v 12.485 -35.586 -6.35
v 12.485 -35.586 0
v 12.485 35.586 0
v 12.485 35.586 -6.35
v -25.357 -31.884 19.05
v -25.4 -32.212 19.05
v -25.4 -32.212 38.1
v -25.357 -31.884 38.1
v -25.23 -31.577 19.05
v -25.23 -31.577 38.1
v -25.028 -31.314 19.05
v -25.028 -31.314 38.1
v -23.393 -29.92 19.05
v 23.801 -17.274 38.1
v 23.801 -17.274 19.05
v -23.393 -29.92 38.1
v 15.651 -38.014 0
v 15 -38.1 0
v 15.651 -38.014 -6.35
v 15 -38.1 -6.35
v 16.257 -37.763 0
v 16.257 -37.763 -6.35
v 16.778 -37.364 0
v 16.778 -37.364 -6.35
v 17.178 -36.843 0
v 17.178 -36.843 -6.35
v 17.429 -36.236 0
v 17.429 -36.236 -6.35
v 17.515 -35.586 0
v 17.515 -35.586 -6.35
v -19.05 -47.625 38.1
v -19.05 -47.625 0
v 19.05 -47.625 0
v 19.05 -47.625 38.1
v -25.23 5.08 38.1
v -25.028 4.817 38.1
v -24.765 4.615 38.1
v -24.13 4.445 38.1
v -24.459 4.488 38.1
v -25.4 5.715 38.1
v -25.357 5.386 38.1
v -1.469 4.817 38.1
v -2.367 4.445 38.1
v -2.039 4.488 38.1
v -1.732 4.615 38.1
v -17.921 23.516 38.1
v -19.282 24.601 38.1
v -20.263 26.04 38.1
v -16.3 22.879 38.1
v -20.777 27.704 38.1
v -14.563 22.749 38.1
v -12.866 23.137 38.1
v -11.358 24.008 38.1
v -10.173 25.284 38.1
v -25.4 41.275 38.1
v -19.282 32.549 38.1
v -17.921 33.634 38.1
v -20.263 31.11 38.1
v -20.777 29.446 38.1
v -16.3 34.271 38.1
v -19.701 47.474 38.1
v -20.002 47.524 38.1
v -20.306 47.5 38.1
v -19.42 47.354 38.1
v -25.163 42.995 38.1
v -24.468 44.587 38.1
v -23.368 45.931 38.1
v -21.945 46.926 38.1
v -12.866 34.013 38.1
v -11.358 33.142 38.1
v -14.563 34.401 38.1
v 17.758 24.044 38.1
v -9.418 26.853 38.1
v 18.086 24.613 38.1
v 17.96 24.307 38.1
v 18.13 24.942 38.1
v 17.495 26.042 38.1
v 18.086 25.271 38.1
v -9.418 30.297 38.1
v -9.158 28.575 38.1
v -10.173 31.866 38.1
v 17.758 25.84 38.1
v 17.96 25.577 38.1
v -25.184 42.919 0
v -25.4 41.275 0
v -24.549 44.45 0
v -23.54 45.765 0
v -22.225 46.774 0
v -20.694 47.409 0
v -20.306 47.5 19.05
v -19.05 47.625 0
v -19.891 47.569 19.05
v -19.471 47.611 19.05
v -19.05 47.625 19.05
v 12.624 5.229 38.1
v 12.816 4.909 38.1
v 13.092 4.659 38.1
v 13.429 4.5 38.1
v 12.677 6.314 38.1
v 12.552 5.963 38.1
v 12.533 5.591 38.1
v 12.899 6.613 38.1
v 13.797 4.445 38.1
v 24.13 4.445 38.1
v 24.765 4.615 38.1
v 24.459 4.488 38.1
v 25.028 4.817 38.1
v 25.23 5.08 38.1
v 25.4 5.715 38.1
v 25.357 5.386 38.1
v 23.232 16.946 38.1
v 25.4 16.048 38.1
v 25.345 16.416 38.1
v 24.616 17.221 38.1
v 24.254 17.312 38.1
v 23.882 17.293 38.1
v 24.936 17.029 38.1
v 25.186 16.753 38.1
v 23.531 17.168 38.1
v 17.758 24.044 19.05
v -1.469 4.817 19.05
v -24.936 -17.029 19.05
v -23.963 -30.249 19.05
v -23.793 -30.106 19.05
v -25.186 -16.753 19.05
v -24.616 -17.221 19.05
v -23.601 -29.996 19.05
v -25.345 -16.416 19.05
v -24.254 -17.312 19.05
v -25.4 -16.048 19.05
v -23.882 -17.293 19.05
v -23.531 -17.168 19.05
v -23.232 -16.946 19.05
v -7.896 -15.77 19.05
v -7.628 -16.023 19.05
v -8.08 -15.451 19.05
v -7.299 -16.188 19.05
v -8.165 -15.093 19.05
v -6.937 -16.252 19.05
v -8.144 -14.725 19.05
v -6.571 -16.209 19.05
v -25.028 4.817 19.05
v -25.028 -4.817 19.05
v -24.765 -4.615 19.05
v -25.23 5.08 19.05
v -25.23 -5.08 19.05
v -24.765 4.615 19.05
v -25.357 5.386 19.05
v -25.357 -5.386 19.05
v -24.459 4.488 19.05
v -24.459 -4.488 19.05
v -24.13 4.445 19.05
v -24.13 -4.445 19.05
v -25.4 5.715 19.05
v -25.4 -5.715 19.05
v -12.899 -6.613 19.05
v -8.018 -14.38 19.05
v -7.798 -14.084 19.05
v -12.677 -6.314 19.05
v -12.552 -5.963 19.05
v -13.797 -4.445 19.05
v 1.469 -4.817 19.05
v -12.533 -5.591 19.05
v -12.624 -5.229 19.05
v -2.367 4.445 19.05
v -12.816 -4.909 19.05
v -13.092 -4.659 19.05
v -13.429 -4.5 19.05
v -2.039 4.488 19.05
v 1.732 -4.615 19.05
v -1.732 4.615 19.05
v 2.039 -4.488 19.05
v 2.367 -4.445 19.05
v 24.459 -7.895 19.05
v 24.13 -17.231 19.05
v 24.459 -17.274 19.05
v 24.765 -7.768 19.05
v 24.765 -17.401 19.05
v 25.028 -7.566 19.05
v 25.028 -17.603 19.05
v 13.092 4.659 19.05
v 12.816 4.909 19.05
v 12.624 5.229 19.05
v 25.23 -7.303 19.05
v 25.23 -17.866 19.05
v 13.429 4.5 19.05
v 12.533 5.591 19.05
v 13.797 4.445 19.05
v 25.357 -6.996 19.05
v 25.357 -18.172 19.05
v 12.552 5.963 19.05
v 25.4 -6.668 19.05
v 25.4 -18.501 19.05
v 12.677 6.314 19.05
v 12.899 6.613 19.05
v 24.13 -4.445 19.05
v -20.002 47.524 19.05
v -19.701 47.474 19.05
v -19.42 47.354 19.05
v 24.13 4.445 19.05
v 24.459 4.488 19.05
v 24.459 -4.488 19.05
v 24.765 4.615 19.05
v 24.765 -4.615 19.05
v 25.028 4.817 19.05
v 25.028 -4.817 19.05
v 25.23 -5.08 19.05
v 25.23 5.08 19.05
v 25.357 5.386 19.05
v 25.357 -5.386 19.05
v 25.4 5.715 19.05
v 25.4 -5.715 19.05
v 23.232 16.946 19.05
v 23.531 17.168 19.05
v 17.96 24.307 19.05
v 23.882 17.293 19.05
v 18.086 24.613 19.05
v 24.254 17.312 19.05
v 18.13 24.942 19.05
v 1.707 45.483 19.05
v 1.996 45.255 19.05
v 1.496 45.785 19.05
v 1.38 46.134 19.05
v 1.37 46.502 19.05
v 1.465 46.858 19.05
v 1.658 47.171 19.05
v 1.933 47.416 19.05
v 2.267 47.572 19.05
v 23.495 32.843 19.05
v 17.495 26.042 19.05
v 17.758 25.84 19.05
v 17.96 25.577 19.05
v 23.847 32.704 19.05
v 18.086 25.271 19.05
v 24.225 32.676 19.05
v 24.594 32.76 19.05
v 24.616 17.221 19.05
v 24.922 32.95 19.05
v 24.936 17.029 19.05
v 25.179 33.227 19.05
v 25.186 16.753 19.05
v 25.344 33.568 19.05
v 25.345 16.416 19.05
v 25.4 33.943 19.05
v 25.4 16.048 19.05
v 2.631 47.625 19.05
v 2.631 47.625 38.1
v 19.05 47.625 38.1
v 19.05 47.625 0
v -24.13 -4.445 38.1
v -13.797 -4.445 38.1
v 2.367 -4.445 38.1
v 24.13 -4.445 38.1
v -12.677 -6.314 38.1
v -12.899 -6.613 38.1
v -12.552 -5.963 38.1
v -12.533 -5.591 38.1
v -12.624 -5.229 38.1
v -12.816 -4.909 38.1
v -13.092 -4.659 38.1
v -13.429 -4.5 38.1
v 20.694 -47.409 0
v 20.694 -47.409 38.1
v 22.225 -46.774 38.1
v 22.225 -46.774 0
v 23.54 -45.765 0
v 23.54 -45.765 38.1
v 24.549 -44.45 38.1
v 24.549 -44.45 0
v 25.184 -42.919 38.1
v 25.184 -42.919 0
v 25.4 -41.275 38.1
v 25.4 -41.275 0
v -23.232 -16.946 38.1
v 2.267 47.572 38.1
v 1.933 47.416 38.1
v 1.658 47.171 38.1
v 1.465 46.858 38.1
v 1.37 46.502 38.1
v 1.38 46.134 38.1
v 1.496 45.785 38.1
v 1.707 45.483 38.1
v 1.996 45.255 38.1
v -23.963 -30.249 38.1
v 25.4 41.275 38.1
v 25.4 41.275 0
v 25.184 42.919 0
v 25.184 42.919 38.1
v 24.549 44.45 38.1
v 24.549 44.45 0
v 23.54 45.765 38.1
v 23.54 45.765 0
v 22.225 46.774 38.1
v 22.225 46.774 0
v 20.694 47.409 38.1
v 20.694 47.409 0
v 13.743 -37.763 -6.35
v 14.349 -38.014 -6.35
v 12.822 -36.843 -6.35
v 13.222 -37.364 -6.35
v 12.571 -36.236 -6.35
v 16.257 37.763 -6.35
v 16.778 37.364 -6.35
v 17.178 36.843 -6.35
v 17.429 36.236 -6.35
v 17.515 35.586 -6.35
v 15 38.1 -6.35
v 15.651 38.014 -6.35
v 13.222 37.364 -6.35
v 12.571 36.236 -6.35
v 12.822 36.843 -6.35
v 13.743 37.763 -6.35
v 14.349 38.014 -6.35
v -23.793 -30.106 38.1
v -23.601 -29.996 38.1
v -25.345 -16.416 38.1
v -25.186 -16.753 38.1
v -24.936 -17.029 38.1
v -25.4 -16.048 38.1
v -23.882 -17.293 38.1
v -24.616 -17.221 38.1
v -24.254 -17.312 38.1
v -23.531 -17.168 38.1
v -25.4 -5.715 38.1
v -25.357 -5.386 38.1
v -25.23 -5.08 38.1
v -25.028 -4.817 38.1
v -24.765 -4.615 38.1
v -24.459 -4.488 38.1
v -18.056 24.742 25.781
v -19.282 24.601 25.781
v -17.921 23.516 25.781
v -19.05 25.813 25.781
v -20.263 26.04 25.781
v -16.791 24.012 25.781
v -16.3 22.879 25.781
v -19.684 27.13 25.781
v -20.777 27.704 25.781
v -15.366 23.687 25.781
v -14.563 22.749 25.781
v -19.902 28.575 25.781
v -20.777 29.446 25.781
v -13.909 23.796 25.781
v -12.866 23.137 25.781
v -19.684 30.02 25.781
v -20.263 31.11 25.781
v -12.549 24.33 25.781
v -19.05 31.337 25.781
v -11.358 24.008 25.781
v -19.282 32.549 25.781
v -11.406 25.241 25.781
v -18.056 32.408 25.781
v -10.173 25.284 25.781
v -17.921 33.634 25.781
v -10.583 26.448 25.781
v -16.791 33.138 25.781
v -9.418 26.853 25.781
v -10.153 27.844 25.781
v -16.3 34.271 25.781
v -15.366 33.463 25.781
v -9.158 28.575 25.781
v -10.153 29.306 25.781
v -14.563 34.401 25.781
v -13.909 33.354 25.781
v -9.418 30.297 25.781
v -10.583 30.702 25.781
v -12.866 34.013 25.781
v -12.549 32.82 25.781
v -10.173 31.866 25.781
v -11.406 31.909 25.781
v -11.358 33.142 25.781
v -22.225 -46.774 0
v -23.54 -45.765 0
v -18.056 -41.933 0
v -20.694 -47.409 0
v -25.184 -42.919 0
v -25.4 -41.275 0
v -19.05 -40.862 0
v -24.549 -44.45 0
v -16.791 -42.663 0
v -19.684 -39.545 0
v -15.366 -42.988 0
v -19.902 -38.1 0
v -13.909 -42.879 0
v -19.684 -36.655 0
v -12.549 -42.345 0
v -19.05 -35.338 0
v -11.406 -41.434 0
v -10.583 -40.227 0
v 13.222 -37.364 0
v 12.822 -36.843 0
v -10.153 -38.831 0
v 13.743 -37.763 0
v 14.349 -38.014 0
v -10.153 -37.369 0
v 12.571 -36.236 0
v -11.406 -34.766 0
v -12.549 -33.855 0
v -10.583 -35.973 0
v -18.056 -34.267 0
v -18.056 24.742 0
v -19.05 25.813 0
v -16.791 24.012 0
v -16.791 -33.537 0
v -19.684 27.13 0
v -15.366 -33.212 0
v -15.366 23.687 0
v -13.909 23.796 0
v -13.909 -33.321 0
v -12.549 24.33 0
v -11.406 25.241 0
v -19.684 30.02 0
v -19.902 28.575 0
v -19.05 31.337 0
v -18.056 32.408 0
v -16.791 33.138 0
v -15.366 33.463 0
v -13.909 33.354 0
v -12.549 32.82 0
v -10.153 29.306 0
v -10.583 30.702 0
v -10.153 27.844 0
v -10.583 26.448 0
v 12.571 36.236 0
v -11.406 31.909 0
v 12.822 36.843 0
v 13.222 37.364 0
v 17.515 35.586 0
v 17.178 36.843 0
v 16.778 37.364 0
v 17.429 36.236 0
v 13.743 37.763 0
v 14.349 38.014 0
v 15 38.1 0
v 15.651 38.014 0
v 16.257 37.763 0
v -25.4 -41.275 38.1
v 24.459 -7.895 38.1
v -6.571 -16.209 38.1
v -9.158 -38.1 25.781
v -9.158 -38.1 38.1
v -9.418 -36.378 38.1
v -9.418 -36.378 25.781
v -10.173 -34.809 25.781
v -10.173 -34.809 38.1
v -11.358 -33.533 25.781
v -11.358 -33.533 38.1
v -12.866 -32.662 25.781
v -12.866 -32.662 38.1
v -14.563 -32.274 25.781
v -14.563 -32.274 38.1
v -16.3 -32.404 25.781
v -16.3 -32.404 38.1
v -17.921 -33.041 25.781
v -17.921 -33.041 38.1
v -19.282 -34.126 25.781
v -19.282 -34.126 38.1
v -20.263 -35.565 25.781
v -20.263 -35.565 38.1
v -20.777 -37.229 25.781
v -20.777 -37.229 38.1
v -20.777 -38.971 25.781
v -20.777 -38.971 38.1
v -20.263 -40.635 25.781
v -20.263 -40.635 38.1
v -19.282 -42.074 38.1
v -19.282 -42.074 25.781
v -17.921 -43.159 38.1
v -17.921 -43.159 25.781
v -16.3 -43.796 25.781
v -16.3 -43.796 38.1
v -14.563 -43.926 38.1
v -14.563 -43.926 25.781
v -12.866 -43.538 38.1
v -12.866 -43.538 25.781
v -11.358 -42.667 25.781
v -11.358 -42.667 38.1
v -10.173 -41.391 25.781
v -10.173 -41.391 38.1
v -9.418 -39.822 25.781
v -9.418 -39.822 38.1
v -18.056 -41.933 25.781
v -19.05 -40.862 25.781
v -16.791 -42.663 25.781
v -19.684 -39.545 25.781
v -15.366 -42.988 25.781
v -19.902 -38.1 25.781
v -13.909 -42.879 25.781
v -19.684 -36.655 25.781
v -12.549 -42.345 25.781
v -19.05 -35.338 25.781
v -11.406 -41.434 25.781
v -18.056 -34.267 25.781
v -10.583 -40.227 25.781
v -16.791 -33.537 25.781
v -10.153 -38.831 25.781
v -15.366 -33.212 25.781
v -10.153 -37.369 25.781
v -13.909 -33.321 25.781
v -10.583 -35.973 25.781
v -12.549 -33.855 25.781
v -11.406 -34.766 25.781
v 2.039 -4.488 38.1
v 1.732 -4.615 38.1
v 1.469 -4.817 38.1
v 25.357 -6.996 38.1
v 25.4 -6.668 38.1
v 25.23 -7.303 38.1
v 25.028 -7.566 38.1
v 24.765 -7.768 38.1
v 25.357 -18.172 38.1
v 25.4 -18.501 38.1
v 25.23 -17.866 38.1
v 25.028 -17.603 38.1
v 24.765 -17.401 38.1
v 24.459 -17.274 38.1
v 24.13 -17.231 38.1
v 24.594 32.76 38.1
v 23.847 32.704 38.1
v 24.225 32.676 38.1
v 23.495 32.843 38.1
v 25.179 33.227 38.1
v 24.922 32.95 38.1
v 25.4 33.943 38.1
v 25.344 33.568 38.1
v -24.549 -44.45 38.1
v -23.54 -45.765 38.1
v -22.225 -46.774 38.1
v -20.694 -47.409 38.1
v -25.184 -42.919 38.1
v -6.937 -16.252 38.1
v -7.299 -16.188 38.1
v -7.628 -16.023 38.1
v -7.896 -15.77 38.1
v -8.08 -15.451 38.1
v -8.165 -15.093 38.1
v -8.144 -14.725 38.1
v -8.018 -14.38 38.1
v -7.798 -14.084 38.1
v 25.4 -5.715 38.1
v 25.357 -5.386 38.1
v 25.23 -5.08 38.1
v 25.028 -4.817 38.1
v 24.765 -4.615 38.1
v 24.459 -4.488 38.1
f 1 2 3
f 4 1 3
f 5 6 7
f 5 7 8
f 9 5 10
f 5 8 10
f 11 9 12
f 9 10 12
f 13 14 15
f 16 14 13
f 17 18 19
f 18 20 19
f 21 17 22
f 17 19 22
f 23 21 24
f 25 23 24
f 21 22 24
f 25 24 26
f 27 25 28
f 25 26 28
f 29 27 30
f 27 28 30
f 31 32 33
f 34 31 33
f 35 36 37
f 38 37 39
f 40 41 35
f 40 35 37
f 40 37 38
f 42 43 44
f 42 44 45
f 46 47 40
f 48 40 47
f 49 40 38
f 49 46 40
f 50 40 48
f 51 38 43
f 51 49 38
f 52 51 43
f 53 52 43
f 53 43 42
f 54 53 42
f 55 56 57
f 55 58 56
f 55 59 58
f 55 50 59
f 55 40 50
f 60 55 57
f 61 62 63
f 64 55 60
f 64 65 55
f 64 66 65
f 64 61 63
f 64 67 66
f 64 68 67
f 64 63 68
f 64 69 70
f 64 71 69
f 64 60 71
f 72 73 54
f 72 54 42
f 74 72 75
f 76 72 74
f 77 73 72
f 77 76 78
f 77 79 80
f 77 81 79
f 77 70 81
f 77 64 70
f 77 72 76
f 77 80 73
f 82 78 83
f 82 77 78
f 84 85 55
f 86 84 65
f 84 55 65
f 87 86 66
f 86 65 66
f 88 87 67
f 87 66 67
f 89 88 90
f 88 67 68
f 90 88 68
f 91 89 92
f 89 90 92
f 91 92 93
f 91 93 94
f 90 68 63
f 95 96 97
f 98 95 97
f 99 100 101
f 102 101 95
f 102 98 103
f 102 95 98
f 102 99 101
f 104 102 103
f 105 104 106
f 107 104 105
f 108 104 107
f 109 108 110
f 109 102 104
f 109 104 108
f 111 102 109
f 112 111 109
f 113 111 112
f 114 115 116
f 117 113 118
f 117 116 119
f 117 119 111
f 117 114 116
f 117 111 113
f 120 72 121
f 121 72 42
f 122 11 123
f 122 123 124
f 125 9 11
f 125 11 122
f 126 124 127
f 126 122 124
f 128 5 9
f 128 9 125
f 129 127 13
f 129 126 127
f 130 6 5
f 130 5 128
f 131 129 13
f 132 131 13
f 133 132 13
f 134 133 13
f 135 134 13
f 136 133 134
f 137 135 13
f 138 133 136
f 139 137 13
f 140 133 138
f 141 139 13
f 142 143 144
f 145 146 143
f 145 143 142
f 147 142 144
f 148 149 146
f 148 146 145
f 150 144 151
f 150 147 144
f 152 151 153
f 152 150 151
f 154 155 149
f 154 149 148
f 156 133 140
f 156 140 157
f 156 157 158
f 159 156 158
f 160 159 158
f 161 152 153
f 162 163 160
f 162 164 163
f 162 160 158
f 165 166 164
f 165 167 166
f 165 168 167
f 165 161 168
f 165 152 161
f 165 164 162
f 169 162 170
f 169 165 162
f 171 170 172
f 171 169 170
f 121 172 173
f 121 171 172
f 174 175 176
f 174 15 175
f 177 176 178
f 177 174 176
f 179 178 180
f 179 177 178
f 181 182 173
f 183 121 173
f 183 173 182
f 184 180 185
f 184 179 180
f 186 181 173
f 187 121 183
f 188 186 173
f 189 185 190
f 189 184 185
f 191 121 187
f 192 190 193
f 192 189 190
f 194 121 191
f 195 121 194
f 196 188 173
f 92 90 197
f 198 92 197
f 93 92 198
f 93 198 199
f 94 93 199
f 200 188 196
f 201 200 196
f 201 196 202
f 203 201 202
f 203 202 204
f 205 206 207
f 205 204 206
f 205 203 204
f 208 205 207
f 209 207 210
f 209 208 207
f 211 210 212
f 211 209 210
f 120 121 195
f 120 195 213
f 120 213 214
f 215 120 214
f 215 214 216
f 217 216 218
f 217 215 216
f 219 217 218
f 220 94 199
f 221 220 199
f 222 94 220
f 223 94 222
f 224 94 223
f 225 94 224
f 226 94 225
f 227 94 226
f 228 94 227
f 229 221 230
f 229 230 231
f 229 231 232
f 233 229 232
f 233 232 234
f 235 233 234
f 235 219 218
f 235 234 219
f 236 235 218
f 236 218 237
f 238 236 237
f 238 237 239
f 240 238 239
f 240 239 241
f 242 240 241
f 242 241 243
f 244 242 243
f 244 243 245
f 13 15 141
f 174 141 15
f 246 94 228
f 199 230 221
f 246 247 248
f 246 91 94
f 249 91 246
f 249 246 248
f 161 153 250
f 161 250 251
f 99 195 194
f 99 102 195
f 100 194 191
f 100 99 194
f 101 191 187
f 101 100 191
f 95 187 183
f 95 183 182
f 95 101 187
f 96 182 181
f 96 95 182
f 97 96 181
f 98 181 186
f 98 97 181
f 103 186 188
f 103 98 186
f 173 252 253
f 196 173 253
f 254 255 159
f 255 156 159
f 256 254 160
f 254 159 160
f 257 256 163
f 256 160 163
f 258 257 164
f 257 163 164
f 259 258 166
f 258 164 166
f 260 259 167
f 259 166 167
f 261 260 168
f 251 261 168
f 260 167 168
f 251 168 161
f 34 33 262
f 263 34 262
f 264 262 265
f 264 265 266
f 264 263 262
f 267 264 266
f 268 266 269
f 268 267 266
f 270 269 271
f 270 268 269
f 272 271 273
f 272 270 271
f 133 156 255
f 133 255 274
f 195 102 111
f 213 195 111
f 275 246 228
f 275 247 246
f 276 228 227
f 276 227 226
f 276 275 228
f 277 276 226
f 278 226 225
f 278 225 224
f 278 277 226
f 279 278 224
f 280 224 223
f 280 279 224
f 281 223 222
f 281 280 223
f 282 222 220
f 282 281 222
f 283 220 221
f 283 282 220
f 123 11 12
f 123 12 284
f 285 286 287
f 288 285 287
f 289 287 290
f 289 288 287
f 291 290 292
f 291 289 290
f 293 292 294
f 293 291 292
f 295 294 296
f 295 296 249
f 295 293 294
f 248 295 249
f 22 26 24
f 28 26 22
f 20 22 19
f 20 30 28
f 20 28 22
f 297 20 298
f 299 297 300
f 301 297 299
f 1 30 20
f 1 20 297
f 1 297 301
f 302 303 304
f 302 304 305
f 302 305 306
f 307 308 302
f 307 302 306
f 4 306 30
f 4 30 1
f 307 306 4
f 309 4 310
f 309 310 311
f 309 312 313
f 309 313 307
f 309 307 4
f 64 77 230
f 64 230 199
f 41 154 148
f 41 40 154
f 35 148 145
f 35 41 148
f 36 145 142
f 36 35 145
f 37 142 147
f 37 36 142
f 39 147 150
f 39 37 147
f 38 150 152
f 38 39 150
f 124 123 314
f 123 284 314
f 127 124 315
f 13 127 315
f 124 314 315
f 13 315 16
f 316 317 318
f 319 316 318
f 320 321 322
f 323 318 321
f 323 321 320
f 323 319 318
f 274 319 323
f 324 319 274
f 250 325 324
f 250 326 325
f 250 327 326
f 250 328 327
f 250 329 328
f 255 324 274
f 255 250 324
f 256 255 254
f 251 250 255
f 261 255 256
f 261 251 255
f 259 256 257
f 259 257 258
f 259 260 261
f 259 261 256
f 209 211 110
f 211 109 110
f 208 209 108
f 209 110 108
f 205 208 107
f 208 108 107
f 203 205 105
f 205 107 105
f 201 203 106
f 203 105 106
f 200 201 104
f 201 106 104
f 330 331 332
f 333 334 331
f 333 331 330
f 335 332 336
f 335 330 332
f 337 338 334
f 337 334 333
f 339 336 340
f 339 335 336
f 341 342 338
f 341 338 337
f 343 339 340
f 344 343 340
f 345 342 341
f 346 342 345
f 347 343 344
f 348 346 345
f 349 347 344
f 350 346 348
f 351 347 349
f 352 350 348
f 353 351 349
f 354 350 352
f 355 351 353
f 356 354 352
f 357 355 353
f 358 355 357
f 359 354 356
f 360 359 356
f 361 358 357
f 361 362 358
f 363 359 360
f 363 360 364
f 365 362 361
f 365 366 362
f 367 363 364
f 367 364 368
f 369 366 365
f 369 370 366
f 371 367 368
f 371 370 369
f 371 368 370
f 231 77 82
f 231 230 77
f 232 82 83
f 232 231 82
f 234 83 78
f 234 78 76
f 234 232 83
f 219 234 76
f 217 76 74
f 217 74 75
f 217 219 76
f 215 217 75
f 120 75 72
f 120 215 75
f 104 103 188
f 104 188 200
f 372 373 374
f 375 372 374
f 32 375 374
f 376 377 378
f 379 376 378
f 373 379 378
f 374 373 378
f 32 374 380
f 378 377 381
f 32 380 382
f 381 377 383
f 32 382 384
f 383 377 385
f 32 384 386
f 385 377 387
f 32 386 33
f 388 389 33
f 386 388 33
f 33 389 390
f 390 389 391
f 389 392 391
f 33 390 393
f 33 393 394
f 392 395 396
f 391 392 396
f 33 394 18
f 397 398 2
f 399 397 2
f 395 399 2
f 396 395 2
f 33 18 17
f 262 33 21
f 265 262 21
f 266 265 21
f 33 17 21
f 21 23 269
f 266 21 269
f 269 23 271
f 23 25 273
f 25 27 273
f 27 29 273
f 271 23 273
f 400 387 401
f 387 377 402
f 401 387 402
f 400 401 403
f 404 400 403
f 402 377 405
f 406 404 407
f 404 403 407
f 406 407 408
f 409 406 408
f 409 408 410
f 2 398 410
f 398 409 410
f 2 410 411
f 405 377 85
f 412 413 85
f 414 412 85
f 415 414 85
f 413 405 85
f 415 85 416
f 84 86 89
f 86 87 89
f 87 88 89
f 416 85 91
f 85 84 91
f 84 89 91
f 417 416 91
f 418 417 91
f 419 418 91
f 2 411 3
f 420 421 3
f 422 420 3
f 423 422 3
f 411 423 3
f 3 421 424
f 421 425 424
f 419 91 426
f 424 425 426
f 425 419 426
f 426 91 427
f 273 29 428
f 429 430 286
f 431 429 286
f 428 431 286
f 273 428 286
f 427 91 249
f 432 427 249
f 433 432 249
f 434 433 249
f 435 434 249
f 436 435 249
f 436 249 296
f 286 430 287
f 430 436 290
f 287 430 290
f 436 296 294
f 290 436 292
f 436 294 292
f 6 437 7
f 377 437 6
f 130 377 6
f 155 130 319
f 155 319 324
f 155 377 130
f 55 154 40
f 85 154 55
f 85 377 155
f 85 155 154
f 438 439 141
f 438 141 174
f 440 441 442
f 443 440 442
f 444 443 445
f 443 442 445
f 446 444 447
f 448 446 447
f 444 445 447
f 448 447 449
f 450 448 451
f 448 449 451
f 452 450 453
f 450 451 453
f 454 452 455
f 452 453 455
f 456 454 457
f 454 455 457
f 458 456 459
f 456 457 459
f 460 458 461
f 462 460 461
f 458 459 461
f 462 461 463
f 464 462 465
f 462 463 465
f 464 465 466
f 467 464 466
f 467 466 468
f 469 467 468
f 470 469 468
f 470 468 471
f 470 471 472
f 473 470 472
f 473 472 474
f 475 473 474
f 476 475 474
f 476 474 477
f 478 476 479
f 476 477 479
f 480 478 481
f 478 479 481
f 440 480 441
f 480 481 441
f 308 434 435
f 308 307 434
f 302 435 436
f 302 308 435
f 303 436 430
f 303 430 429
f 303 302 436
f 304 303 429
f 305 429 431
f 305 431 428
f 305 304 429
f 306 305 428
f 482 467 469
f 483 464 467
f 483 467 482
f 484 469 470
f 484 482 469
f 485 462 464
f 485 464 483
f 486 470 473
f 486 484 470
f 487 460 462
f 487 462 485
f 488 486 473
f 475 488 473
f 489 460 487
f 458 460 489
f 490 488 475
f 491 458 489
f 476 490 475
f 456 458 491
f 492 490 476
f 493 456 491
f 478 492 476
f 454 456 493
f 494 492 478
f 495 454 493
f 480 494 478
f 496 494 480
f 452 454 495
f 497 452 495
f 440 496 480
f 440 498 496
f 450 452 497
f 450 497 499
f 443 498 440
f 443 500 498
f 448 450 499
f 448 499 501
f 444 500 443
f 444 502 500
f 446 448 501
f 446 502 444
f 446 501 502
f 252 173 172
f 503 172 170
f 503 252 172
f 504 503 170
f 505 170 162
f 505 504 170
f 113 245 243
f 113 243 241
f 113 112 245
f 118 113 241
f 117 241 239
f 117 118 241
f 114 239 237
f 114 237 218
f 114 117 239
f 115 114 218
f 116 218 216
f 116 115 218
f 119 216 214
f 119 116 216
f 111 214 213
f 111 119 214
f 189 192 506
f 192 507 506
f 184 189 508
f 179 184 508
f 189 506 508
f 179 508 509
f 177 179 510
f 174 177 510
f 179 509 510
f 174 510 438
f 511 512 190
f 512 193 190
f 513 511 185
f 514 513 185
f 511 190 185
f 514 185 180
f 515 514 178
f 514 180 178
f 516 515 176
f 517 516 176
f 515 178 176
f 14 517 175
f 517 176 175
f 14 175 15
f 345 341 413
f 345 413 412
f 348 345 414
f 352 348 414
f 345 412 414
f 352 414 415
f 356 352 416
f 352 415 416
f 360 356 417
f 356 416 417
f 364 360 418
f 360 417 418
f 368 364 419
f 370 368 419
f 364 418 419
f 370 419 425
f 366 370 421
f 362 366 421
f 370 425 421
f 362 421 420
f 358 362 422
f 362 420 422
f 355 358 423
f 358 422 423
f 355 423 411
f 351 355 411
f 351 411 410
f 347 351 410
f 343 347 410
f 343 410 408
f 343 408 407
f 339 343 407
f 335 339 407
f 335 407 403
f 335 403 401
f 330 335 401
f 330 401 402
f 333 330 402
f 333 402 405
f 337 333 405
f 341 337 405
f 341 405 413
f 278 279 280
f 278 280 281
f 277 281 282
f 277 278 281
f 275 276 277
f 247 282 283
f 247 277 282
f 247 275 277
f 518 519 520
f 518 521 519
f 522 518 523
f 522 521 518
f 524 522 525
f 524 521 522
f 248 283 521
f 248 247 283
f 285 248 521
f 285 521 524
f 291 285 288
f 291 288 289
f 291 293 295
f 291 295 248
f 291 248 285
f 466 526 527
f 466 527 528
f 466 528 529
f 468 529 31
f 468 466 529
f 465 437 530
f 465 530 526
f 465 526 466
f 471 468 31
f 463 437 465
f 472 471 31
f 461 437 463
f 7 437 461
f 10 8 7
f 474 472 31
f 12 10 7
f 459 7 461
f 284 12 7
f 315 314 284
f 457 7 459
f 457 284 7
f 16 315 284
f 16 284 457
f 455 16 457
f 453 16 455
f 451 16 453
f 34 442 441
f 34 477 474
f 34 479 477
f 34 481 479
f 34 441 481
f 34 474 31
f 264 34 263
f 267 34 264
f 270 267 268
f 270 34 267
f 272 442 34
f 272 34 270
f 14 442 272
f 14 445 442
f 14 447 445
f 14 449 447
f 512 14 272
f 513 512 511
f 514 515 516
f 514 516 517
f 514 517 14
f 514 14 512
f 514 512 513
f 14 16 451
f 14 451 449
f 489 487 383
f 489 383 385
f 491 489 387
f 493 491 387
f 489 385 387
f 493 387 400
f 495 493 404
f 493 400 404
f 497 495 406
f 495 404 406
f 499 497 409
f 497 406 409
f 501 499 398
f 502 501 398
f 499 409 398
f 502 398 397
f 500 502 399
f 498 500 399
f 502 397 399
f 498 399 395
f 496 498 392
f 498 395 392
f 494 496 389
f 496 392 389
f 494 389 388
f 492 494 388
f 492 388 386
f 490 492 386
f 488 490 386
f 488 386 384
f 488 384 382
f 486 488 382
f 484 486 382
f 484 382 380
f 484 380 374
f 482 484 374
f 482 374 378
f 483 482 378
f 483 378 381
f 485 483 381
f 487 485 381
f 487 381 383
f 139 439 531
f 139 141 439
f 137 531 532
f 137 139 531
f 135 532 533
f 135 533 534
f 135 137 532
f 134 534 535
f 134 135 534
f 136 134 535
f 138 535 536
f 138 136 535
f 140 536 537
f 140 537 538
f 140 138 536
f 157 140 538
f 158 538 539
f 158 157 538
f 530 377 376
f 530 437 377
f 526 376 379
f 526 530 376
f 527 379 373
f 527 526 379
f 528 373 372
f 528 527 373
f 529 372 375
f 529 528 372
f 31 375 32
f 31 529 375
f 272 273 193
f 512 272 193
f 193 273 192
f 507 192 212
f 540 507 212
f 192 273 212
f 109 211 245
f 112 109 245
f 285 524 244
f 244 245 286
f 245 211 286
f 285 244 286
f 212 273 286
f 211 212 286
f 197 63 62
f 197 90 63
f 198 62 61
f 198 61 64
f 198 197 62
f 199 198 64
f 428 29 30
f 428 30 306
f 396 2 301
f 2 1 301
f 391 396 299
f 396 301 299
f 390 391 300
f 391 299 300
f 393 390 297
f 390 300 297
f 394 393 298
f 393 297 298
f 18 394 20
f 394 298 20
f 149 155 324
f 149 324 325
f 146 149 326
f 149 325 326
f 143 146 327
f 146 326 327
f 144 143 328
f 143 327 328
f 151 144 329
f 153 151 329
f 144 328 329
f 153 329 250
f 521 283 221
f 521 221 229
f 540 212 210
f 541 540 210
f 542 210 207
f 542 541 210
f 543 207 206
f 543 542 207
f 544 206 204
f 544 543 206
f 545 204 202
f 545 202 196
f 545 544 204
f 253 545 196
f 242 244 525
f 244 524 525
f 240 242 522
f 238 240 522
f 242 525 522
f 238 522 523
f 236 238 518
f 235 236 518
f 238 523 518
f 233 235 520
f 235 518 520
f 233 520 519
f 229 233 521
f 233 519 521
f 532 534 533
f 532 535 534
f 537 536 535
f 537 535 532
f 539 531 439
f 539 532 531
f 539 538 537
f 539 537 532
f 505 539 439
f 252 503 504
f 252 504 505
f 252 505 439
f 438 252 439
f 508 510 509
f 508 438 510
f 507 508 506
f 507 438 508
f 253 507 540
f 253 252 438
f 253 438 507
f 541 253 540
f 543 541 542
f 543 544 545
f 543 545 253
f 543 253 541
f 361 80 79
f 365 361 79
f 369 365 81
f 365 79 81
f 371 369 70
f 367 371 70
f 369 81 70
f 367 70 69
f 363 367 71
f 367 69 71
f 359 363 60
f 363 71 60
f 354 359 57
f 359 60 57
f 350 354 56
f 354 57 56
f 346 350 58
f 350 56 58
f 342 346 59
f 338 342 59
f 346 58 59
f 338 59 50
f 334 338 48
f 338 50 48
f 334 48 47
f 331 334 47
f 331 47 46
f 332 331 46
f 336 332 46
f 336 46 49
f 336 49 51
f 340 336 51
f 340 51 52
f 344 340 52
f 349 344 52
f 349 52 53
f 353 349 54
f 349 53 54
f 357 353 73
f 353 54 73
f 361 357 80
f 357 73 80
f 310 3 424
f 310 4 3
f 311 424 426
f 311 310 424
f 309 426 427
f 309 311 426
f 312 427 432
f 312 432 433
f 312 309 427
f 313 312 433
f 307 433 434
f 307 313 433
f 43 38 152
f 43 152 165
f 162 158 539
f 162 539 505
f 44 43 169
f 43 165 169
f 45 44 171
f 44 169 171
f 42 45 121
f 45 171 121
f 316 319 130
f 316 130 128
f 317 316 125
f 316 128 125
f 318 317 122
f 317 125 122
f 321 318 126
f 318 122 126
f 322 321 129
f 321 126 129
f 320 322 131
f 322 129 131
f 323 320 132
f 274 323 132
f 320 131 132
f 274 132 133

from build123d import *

# Parameters (mm, degrees)
SKETCH1_W           = 50.8
SKETCH1_H           = 95.25
BOSS_EXTRUDE1_DEPTH = 38.1
SKETCH2_W           = 74.255386752
SKETCH2_H           = 8.89
F_0_DEG_SLOT_DEPTH  = 19.05
SKETCH3_W           = 5.0292
SKETCH3_H           = 76.2
BOSS_EXTRUDE2_DEPTH = 6.35
SKETCH4_R           = 4.9022
CUT_EXTRUDE2_DEPTH  = 67.067470248
SKETCH5_R           = 5.842
CUT_EXTRUDE3_DEPTH  = 12.319
F_45DEG_SLOT_DEPTH  = 19.05
F_30_DEG_SLOT_DEPTH = 19.05
FILLET2_R           = 6.35
F_15_DEG_SLOT_DEPTH = 19.05
FILLET4_R           = 2.5146
FILLET3_R           = 1.27


with BuildPart() as part:
    # Sketch1 → Boss-Extrude1 (new body)
    with BuildSketch(Plane.XY):
        Rectangle(SKETCH1_W, SKETCH1_H)
    extrude(amount=BOSS_EXTRUDE1_DEPTH)

    # Sketch2 → 0 deg slot (cut)
    with BuildSketch(Plane.XY.offset(38.1)):
        Rectangle(SKETCH2_W, SKETCH2_H)
    extrude(amount=-F_0_DEG_SLOT_DEPTH, mode=Mode.SUBTRACT)

    # Sketch3 → Boss-Extrude2 (add)
    with BuildSketch(Plane(origin=(0, 0, 0), x_dir=(-1, 0, 0), z_dir=(0, 0, -1))):
        with Locations((-15, 0)):
            Rectangle(SKETCH3_W, SKETCH3_H)
    extrude(amount=BOSS_EXTRUDE2_DEPTH)

    # Sketch4 → Cut-Extrude2 (cut, through all)
    with BuildSketch(Plane(origin=(0, 0, 0), x_dir=(-1, 0, 0), z_dir=(0, 0, -1))):
        with Locations((15, 28.575)):
            Circle(SKETCH4_R)
        with Locations((15, -38.1)):
            Circle(SKETCH4_R)
    extrude(amount=-CUT_EXTRUDE2_DEPTH, mode=Mode.SUBTRACT)

    # Sketch5 → Cut-Extrude3 (cut)
    with BuildSketch(Plane.XY.offset(38.1)):
        with Locations((-15, -38.1)):
            Circle(SKETCH5_R)
        with Locations((-15, 28.575)):
            Circle(SKETCH5_R)
    extrude(amount=-CUT_EXTRUDE3_DEPTH, mode=Mode.SUBTRACT)

    # Sketch6 → 45deg slot (cut)
    with BuildSketch(Plane.XY.offset(38.1)):
        Polygon((42.977263594, 49.263442879), (-49.263442879, -42.977263594), (-42.977263594, -49.263442879), (49.263442879, 42.977263594), align=None)
    extrude(amount=-F_45DEG_SLOT_DEPTH, mode=Mode.SUBTRACT)

    # Sketch7 → 30 deg slot (cut)
    with BuildSketch(Plane.XY.offset(38.1)):
        Polygon((48.969673612, 7.869701865), (-53.414673612, 66.981332296), (-48.969673612, 74.680298135), (53.414673612, 15.568667704), align=None)
    extrude(amount=-F_30_DEG_SLOT_DEPTH, mode=Mode.SUBTRACT)

    # Fillet2
    fillet2_edges = [part.edges().sort_by_distance(p)[0] for p in [
        (-25.4, -47.625, 19.05),
        (25.4, -47.625, 19.05),
        (25.4, 47.625, 19.05),
        (-25.4, 47.625, 19.05),
    ]]
    fillet(fillet2_edges, radius=FILLET2_R)

    # Sketch10 → 15 deg slot (cut)
    with BuildSketch(Plane.XY.offset(38.1)):
        Polygon((55.707123796, -8.725123788), (-53.406222485, -37.961956807), (-55.707123796, -29.374876212), (53.406222485, -0.138043193), align=None)
    extrude(amount=-F_15_DEG_SLOT_DEPTH, mode=Mode.SUBTRACT)

    # Fillet4
    fillet4_edges = [part.edges().sort_by_distance(p)[0] for p in [
        (12.4854, 38.1, -3.175),
        (17.5146, 38.1, -3.175),
        (17.5146, -38.1, -3.175),
        (12.4854, -38.1, -3.175),
    ]]
    fillet(fillet4_edges, radius=FILLET4_R - 0.0001)  # a hair under: the kernel refuses the full size

    # Fillet3
    fillet3_edges = [part.edges().sort_by_distance(p)[0] for p in [
        (18.928057645, 25.21423693, 28.575),
        (-2.108522628, 47.625, 28.575),
        (25.4, 31.742947056, 28.575),
        (-19.809556788, 47.579409051, 28.575),
        (-23.721882631, -30.008061916, 28.575),
        (-11.149524062, -17.435703346, 28.575),
        (25.4, -7.64228789, 28.575),
        (25.4, -16.845893134, 28.575),
        (25.4, -4.445, 28.575),
        (-25.4, -4.445, 28.575),
        (25.4, 4.445, 28.575),
        (-25.4, 4.445, 28.575),
        (10.731179285, 4.445, 28.575),
        (-1.841179285, 4.445, 28.575),
        (-25.4, -19.113820715, 28.575),
        (-10.731179285, -4.445, 28.575),
        (25.4, 19.113820715, 28.575),
        (-25.4, -31.686179285, 28.575),
        (1.841179285, -4.445, 28.575),
    ]]
    fillet(fillet3_edges, radius=FILLET3_R)


solid = part.part
